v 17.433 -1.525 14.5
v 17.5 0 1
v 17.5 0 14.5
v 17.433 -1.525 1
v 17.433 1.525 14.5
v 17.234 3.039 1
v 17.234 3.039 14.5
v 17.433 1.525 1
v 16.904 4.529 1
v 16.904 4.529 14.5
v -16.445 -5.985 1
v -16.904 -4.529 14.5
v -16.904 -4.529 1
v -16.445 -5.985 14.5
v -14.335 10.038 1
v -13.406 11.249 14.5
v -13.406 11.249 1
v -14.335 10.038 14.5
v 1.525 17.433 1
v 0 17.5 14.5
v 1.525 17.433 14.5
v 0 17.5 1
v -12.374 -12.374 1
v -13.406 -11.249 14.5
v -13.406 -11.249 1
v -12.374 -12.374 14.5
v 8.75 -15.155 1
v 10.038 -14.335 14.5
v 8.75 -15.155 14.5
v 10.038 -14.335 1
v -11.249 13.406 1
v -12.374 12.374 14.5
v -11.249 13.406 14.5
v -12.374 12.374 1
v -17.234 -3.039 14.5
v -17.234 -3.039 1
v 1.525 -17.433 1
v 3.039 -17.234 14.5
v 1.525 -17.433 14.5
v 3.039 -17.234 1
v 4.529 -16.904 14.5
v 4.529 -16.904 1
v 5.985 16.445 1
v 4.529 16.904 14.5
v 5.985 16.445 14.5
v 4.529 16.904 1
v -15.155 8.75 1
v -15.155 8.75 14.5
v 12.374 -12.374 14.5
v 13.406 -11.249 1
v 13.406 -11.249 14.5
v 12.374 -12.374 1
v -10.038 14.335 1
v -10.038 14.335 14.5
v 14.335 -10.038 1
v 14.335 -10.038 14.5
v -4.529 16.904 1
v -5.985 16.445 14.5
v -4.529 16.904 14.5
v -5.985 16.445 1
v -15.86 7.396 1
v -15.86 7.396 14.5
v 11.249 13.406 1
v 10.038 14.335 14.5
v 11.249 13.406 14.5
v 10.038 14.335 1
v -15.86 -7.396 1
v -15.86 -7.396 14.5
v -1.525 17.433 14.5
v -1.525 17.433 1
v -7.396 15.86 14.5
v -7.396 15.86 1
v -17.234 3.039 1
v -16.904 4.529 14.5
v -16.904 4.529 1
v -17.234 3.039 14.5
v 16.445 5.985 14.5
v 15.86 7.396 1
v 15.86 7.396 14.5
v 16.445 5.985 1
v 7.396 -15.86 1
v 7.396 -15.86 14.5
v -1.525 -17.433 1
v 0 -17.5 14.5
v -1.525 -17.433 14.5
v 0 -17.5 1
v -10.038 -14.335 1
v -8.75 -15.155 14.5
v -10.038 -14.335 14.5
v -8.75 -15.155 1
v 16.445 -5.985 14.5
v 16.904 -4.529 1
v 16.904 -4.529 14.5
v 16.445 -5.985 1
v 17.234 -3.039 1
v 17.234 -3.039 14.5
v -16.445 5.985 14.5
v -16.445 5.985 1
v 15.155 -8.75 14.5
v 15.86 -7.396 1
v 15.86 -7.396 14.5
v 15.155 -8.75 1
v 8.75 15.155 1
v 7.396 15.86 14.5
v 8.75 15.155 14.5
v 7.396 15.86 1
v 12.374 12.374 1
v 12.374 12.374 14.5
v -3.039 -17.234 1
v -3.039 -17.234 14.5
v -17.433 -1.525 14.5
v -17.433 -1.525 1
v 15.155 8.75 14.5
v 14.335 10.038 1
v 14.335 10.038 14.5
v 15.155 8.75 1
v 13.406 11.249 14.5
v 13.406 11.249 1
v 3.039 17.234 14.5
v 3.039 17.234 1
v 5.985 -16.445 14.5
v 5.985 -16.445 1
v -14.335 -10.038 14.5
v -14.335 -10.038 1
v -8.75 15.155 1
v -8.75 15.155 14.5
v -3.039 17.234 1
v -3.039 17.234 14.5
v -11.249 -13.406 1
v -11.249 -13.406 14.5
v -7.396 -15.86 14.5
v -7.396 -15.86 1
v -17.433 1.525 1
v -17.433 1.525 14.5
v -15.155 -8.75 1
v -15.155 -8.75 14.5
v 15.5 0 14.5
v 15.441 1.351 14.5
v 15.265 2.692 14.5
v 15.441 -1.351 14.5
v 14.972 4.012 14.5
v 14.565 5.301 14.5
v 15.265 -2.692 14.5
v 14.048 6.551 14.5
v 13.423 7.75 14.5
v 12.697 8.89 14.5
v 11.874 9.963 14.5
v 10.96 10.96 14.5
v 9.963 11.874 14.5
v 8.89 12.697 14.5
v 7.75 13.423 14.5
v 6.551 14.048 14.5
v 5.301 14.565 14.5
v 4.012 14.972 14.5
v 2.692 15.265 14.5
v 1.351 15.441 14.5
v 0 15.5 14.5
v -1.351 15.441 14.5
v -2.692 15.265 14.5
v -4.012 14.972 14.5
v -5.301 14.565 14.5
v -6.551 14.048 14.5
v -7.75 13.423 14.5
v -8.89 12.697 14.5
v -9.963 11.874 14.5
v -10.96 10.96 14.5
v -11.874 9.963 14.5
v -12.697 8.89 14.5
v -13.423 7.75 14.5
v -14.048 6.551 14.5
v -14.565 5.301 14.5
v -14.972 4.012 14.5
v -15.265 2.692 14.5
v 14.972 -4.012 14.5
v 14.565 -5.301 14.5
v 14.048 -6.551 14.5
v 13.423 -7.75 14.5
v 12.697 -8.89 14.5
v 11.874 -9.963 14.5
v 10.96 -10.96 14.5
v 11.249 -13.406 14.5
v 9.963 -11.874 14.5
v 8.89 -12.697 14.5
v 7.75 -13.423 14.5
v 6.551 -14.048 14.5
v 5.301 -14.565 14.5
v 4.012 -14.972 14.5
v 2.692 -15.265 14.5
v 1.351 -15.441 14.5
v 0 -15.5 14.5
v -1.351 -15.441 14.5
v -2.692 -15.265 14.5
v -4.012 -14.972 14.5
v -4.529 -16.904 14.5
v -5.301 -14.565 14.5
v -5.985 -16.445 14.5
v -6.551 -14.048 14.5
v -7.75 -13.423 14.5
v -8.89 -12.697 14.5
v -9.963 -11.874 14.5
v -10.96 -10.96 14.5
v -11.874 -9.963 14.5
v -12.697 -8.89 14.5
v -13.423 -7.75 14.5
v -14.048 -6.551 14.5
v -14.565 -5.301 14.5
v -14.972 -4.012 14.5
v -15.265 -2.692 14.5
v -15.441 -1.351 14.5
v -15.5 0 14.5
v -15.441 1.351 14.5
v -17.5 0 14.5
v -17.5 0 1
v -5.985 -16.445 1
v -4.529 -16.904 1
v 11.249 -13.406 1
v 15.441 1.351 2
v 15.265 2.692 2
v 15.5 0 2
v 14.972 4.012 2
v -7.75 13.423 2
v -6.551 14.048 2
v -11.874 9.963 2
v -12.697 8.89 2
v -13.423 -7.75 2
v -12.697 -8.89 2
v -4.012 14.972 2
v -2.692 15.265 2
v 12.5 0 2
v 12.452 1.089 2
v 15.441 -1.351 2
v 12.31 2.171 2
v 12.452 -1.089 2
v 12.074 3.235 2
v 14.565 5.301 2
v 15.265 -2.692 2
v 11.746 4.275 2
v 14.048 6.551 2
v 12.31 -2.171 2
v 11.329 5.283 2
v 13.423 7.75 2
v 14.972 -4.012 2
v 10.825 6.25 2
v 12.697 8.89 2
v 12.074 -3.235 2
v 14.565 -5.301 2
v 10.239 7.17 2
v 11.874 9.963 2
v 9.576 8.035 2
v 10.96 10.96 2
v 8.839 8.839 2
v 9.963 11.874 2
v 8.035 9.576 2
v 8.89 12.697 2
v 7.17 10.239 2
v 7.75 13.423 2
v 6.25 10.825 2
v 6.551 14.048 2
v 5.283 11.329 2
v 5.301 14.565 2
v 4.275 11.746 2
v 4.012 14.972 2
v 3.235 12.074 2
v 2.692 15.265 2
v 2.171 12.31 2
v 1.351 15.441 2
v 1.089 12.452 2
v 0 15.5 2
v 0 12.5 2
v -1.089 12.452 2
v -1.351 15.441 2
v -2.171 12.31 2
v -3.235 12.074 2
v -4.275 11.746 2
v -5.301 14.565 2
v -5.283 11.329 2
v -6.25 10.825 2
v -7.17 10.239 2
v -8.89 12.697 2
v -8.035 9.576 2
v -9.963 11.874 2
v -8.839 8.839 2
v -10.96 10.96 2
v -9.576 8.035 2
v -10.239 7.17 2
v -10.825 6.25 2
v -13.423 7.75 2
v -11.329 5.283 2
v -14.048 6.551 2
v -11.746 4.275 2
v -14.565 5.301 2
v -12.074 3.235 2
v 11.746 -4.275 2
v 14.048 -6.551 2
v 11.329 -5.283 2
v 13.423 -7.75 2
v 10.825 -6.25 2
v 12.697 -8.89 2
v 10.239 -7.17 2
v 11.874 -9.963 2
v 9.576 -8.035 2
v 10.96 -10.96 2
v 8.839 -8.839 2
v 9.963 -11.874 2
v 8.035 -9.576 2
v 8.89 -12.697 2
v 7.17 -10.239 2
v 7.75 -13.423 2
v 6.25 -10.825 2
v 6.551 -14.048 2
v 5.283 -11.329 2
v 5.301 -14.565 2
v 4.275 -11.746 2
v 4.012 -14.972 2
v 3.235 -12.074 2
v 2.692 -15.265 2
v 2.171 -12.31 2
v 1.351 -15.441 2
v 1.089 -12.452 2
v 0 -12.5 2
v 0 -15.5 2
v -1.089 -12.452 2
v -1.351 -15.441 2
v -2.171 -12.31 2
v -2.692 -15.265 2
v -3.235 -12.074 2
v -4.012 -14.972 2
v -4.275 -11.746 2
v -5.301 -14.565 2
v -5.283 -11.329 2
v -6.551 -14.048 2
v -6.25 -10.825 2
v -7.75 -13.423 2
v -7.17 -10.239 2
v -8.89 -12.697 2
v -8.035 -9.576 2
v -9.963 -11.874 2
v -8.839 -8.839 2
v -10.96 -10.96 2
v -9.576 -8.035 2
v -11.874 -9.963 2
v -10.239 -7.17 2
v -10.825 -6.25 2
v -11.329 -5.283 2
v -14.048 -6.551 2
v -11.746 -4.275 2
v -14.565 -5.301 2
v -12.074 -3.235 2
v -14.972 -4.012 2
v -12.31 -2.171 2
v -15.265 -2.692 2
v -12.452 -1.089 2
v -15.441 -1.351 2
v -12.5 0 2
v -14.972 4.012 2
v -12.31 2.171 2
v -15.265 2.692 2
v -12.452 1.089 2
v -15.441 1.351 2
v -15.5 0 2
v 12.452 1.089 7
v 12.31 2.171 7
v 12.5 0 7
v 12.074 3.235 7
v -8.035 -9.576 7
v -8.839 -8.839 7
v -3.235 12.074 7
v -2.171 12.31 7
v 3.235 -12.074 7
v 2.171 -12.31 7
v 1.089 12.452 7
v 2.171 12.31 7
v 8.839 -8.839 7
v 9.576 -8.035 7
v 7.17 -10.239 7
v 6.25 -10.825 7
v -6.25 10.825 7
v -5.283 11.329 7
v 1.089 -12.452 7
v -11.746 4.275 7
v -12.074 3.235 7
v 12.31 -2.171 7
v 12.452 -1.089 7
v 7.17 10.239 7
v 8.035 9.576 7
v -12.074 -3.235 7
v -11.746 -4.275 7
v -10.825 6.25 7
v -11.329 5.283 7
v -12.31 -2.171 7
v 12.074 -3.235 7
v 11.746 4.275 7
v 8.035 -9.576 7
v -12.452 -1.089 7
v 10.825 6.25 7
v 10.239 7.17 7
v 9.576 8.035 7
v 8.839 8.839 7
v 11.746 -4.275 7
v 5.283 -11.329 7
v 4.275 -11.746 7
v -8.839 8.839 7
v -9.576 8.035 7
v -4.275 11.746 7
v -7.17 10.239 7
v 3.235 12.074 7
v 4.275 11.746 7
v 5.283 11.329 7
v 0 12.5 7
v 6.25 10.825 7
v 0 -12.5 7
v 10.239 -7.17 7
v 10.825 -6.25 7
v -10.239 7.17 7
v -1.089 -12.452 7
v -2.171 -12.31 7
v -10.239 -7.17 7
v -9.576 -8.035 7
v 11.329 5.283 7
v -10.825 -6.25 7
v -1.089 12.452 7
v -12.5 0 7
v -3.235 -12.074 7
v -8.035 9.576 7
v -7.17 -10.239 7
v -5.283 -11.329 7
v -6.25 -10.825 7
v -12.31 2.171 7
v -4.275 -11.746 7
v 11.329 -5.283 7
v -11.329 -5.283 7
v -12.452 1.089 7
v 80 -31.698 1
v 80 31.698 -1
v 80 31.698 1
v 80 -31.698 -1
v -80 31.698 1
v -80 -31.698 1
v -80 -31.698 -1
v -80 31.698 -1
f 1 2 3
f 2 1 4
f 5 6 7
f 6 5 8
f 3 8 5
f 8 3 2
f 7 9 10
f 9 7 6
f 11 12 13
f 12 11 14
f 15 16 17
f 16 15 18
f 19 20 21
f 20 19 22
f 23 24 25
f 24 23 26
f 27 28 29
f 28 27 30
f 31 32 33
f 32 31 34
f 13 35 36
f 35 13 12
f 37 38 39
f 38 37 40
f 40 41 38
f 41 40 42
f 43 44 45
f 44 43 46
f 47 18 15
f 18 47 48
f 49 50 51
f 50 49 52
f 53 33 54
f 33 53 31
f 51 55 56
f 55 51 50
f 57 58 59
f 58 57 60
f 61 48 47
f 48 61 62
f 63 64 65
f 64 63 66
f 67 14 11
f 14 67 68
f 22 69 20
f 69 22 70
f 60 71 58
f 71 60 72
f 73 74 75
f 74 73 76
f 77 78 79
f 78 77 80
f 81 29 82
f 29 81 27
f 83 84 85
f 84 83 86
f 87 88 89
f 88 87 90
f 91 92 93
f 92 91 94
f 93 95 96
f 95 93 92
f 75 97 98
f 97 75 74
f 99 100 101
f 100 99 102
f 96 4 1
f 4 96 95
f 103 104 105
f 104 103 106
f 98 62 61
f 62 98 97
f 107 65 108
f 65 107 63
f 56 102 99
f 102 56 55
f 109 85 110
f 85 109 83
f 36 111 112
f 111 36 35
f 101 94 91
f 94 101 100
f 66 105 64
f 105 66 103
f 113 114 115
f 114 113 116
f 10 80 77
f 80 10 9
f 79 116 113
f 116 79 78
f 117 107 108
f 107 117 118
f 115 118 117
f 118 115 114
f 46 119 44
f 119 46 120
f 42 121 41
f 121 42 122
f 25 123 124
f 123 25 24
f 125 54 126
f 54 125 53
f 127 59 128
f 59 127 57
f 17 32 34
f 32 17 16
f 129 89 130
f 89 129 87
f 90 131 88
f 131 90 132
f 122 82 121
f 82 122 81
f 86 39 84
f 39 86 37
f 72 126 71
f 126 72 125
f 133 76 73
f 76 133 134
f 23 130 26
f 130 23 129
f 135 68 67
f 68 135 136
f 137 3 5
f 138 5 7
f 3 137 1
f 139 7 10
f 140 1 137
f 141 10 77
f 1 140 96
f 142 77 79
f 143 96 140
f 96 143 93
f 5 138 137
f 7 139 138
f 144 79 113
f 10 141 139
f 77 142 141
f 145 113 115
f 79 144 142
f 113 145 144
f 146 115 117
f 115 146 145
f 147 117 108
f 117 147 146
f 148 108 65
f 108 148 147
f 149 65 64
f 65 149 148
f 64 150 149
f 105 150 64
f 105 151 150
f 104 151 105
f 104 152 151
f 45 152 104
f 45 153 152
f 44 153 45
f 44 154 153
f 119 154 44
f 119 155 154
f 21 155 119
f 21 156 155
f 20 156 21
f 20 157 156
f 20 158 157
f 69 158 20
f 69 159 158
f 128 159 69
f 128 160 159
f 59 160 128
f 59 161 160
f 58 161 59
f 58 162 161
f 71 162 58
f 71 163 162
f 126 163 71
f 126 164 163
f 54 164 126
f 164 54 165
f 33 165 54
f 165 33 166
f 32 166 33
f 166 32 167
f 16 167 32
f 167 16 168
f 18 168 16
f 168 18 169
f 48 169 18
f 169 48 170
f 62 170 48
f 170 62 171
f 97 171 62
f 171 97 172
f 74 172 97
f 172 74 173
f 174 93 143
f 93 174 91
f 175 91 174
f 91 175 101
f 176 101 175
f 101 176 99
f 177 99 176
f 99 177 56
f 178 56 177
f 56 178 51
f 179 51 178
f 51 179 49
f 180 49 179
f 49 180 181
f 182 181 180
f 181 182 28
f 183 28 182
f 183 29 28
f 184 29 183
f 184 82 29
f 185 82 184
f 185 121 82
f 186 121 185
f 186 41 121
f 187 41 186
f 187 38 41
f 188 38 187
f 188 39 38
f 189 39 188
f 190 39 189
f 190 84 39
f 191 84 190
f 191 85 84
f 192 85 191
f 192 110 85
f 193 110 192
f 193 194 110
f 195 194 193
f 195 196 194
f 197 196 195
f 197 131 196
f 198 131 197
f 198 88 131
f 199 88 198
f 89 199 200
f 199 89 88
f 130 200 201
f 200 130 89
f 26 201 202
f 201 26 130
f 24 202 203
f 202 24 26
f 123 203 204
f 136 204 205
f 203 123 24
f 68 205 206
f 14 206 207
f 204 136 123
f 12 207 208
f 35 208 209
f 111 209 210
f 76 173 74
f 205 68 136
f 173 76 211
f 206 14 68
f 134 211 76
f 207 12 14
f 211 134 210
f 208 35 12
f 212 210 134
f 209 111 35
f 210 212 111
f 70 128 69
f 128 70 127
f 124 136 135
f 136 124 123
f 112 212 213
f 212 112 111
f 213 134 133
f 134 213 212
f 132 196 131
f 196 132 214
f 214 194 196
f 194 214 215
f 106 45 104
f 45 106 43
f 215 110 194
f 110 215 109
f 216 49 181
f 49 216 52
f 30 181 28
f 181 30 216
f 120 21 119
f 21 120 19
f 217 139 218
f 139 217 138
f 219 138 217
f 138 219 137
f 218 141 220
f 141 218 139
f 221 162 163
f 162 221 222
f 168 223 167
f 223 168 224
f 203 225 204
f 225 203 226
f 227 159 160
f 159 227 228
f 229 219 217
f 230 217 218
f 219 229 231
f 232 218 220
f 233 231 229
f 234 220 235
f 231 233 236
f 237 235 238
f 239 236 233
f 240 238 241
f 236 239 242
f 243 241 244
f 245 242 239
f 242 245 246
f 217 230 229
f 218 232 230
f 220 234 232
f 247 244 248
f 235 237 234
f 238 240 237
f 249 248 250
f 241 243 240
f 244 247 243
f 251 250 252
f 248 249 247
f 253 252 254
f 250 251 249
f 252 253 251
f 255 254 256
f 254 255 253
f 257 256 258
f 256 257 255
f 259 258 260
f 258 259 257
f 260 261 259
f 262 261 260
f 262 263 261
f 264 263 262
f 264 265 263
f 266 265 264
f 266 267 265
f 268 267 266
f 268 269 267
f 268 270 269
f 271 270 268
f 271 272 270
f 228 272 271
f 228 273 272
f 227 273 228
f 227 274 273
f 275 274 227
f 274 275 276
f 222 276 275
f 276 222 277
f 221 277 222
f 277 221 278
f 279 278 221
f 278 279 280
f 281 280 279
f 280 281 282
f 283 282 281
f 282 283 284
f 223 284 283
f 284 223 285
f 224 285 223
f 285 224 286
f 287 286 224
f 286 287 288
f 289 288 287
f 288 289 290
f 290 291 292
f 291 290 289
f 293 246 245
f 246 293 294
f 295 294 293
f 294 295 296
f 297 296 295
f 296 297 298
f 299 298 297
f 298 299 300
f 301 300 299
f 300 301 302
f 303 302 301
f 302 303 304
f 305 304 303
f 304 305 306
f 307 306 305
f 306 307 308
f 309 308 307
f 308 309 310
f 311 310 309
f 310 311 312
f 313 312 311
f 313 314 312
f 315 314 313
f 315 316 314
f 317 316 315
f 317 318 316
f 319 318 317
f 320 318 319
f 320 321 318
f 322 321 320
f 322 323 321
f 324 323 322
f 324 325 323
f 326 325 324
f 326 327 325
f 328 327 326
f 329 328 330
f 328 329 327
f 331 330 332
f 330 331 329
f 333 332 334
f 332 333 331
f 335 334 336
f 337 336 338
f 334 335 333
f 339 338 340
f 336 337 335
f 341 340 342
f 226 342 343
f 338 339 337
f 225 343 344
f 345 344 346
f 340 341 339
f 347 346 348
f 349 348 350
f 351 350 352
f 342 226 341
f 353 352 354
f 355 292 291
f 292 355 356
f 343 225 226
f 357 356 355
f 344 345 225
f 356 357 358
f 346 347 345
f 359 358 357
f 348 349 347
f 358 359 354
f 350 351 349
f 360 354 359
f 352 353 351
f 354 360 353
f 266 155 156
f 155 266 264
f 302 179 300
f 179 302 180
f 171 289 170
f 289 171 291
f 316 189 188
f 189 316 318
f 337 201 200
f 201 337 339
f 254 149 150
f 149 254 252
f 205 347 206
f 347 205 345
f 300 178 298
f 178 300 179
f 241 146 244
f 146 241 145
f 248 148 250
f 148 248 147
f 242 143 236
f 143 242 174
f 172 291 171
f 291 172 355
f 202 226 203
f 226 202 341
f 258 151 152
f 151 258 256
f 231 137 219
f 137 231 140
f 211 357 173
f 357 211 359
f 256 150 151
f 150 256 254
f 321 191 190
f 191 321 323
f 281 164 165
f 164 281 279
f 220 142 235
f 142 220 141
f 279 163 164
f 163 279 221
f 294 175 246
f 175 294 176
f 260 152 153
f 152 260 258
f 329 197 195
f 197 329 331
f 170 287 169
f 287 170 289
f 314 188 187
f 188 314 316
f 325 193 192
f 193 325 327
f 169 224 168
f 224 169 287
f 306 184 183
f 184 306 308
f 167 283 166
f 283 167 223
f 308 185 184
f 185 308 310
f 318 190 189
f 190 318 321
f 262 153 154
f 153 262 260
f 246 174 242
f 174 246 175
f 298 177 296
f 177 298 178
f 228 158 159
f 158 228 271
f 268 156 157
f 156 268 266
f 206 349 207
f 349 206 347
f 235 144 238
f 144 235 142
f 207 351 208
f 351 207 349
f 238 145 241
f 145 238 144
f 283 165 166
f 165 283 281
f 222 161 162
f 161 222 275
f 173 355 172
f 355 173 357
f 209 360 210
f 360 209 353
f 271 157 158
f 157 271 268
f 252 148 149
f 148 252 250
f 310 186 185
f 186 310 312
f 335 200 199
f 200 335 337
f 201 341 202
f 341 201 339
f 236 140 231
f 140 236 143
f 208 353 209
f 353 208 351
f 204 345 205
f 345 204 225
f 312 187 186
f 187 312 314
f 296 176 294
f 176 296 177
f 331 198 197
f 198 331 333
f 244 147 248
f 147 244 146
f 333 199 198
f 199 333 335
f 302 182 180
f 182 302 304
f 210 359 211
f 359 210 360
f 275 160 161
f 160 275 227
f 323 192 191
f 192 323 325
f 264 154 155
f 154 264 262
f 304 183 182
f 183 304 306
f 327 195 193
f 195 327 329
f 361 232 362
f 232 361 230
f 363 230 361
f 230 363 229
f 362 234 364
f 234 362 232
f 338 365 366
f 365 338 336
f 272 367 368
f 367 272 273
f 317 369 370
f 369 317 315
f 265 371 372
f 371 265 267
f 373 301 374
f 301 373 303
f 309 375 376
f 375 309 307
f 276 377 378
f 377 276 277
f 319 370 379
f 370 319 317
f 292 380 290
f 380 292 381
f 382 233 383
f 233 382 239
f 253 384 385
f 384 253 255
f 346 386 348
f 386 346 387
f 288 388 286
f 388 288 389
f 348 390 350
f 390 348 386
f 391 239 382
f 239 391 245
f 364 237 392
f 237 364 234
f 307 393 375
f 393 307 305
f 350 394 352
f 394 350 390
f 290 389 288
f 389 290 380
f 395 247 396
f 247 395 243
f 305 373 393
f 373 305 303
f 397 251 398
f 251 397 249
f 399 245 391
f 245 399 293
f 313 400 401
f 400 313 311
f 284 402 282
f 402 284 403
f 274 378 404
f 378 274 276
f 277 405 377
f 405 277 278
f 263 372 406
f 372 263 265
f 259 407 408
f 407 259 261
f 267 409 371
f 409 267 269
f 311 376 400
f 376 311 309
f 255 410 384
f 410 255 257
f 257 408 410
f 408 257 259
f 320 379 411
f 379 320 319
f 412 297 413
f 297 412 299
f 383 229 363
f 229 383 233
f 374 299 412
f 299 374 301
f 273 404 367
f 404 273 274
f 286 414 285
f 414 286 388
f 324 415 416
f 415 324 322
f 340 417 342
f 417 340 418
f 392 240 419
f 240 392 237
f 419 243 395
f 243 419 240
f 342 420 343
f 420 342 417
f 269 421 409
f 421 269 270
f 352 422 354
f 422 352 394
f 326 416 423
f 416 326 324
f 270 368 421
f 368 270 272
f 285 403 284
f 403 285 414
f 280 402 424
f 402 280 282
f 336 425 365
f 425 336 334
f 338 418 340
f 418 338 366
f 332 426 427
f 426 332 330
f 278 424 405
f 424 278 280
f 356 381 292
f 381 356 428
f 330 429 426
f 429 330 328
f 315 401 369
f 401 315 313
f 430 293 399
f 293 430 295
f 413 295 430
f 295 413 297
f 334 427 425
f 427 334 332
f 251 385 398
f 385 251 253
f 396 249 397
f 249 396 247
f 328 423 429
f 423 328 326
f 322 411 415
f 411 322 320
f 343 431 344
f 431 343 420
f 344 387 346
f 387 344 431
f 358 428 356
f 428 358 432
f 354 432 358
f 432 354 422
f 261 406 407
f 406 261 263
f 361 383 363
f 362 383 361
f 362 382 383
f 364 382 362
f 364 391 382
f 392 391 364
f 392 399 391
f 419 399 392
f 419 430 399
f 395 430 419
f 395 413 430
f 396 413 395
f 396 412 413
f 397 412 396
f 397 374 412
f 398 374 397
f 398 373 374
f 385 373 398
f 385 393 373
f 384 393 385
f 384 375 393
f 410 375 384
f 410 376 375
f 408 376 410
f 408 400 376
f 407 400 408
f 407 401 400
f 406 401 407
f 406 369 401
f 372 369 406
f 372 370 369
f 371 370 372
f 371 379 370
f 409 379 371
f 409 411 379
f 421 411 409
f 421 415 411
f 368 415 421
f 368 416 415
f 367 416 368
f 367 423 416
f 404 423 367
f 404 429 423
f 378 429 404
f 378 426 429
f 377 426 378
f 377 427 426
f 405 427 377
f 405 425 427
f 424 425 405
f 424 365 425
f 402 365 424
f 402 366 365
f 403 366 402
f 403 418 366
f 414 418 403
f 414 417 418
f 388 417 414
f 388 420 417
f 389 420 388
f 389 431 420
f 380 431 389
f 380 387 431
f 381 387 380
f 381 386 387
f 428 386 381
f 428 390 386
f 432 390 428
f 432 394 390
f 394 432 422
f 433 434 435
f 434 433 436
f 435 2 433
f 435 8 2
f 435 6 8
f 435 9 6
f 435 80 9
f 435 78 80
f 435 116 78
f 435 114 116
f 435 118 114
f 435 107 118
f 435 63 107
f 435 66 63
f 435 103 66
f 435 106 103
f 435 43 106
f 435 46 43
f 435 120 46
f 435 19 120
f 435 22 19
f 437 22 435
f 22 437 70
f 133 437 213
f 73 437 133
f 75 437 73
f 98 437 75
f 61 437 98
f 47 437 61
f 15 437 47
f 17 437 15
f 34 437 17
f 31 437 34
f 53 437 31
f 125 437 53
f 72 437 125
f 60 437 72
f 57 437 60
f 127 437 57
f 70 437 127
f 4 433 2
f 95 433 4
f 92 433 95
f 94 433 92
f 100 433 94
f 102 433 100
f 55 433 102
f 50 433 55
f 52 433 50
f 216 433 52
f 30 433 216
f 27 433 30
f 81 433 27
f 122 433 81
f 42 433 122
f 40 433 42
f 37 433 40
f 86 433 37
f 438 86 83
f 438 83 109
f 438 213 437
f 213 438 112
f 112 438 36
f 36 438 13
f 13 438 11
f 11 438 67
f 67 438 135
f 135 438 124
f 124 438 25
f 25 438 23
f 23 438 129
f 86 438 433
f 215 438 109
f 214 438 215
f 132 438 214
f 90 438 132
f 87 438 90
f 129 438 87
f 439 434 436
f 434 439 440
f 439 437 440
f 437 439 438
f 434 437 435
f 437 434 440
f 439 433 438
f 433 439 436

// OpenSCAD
inner_button_diameter_mm = 25;
inner_button_depth_mm = 5;
outer_button_diameter_mm = 31;
outer_button_depth_mm = 12.5;

base_height_mm = 2;
shell_width_mm = 2;

// the final width of the start button
final_width_mm = 160;

// You shouldn't need to adjust anything below this line

scale_factor = final_width_mm / 53;

$fn=72;

union() {
    difference() {
        cylinder(h=base_height_mm + outer_button_depth_mm, d=outer_button_diameter_mm + 2 * shell_width_mm);
        translate([0, 0, base_height_mm])
            cylinder(h=outer_button_depth_mm+1, d=outer_button_diameter_mm);
    }
    translate([0, 0, base_height_mm])
        cylinder(h=inner_button_depth_mm, d=inner_button_diameter_mm);
    cube([final_width_mm, 21*scale_factor, base_height_mm], center=true);
};
